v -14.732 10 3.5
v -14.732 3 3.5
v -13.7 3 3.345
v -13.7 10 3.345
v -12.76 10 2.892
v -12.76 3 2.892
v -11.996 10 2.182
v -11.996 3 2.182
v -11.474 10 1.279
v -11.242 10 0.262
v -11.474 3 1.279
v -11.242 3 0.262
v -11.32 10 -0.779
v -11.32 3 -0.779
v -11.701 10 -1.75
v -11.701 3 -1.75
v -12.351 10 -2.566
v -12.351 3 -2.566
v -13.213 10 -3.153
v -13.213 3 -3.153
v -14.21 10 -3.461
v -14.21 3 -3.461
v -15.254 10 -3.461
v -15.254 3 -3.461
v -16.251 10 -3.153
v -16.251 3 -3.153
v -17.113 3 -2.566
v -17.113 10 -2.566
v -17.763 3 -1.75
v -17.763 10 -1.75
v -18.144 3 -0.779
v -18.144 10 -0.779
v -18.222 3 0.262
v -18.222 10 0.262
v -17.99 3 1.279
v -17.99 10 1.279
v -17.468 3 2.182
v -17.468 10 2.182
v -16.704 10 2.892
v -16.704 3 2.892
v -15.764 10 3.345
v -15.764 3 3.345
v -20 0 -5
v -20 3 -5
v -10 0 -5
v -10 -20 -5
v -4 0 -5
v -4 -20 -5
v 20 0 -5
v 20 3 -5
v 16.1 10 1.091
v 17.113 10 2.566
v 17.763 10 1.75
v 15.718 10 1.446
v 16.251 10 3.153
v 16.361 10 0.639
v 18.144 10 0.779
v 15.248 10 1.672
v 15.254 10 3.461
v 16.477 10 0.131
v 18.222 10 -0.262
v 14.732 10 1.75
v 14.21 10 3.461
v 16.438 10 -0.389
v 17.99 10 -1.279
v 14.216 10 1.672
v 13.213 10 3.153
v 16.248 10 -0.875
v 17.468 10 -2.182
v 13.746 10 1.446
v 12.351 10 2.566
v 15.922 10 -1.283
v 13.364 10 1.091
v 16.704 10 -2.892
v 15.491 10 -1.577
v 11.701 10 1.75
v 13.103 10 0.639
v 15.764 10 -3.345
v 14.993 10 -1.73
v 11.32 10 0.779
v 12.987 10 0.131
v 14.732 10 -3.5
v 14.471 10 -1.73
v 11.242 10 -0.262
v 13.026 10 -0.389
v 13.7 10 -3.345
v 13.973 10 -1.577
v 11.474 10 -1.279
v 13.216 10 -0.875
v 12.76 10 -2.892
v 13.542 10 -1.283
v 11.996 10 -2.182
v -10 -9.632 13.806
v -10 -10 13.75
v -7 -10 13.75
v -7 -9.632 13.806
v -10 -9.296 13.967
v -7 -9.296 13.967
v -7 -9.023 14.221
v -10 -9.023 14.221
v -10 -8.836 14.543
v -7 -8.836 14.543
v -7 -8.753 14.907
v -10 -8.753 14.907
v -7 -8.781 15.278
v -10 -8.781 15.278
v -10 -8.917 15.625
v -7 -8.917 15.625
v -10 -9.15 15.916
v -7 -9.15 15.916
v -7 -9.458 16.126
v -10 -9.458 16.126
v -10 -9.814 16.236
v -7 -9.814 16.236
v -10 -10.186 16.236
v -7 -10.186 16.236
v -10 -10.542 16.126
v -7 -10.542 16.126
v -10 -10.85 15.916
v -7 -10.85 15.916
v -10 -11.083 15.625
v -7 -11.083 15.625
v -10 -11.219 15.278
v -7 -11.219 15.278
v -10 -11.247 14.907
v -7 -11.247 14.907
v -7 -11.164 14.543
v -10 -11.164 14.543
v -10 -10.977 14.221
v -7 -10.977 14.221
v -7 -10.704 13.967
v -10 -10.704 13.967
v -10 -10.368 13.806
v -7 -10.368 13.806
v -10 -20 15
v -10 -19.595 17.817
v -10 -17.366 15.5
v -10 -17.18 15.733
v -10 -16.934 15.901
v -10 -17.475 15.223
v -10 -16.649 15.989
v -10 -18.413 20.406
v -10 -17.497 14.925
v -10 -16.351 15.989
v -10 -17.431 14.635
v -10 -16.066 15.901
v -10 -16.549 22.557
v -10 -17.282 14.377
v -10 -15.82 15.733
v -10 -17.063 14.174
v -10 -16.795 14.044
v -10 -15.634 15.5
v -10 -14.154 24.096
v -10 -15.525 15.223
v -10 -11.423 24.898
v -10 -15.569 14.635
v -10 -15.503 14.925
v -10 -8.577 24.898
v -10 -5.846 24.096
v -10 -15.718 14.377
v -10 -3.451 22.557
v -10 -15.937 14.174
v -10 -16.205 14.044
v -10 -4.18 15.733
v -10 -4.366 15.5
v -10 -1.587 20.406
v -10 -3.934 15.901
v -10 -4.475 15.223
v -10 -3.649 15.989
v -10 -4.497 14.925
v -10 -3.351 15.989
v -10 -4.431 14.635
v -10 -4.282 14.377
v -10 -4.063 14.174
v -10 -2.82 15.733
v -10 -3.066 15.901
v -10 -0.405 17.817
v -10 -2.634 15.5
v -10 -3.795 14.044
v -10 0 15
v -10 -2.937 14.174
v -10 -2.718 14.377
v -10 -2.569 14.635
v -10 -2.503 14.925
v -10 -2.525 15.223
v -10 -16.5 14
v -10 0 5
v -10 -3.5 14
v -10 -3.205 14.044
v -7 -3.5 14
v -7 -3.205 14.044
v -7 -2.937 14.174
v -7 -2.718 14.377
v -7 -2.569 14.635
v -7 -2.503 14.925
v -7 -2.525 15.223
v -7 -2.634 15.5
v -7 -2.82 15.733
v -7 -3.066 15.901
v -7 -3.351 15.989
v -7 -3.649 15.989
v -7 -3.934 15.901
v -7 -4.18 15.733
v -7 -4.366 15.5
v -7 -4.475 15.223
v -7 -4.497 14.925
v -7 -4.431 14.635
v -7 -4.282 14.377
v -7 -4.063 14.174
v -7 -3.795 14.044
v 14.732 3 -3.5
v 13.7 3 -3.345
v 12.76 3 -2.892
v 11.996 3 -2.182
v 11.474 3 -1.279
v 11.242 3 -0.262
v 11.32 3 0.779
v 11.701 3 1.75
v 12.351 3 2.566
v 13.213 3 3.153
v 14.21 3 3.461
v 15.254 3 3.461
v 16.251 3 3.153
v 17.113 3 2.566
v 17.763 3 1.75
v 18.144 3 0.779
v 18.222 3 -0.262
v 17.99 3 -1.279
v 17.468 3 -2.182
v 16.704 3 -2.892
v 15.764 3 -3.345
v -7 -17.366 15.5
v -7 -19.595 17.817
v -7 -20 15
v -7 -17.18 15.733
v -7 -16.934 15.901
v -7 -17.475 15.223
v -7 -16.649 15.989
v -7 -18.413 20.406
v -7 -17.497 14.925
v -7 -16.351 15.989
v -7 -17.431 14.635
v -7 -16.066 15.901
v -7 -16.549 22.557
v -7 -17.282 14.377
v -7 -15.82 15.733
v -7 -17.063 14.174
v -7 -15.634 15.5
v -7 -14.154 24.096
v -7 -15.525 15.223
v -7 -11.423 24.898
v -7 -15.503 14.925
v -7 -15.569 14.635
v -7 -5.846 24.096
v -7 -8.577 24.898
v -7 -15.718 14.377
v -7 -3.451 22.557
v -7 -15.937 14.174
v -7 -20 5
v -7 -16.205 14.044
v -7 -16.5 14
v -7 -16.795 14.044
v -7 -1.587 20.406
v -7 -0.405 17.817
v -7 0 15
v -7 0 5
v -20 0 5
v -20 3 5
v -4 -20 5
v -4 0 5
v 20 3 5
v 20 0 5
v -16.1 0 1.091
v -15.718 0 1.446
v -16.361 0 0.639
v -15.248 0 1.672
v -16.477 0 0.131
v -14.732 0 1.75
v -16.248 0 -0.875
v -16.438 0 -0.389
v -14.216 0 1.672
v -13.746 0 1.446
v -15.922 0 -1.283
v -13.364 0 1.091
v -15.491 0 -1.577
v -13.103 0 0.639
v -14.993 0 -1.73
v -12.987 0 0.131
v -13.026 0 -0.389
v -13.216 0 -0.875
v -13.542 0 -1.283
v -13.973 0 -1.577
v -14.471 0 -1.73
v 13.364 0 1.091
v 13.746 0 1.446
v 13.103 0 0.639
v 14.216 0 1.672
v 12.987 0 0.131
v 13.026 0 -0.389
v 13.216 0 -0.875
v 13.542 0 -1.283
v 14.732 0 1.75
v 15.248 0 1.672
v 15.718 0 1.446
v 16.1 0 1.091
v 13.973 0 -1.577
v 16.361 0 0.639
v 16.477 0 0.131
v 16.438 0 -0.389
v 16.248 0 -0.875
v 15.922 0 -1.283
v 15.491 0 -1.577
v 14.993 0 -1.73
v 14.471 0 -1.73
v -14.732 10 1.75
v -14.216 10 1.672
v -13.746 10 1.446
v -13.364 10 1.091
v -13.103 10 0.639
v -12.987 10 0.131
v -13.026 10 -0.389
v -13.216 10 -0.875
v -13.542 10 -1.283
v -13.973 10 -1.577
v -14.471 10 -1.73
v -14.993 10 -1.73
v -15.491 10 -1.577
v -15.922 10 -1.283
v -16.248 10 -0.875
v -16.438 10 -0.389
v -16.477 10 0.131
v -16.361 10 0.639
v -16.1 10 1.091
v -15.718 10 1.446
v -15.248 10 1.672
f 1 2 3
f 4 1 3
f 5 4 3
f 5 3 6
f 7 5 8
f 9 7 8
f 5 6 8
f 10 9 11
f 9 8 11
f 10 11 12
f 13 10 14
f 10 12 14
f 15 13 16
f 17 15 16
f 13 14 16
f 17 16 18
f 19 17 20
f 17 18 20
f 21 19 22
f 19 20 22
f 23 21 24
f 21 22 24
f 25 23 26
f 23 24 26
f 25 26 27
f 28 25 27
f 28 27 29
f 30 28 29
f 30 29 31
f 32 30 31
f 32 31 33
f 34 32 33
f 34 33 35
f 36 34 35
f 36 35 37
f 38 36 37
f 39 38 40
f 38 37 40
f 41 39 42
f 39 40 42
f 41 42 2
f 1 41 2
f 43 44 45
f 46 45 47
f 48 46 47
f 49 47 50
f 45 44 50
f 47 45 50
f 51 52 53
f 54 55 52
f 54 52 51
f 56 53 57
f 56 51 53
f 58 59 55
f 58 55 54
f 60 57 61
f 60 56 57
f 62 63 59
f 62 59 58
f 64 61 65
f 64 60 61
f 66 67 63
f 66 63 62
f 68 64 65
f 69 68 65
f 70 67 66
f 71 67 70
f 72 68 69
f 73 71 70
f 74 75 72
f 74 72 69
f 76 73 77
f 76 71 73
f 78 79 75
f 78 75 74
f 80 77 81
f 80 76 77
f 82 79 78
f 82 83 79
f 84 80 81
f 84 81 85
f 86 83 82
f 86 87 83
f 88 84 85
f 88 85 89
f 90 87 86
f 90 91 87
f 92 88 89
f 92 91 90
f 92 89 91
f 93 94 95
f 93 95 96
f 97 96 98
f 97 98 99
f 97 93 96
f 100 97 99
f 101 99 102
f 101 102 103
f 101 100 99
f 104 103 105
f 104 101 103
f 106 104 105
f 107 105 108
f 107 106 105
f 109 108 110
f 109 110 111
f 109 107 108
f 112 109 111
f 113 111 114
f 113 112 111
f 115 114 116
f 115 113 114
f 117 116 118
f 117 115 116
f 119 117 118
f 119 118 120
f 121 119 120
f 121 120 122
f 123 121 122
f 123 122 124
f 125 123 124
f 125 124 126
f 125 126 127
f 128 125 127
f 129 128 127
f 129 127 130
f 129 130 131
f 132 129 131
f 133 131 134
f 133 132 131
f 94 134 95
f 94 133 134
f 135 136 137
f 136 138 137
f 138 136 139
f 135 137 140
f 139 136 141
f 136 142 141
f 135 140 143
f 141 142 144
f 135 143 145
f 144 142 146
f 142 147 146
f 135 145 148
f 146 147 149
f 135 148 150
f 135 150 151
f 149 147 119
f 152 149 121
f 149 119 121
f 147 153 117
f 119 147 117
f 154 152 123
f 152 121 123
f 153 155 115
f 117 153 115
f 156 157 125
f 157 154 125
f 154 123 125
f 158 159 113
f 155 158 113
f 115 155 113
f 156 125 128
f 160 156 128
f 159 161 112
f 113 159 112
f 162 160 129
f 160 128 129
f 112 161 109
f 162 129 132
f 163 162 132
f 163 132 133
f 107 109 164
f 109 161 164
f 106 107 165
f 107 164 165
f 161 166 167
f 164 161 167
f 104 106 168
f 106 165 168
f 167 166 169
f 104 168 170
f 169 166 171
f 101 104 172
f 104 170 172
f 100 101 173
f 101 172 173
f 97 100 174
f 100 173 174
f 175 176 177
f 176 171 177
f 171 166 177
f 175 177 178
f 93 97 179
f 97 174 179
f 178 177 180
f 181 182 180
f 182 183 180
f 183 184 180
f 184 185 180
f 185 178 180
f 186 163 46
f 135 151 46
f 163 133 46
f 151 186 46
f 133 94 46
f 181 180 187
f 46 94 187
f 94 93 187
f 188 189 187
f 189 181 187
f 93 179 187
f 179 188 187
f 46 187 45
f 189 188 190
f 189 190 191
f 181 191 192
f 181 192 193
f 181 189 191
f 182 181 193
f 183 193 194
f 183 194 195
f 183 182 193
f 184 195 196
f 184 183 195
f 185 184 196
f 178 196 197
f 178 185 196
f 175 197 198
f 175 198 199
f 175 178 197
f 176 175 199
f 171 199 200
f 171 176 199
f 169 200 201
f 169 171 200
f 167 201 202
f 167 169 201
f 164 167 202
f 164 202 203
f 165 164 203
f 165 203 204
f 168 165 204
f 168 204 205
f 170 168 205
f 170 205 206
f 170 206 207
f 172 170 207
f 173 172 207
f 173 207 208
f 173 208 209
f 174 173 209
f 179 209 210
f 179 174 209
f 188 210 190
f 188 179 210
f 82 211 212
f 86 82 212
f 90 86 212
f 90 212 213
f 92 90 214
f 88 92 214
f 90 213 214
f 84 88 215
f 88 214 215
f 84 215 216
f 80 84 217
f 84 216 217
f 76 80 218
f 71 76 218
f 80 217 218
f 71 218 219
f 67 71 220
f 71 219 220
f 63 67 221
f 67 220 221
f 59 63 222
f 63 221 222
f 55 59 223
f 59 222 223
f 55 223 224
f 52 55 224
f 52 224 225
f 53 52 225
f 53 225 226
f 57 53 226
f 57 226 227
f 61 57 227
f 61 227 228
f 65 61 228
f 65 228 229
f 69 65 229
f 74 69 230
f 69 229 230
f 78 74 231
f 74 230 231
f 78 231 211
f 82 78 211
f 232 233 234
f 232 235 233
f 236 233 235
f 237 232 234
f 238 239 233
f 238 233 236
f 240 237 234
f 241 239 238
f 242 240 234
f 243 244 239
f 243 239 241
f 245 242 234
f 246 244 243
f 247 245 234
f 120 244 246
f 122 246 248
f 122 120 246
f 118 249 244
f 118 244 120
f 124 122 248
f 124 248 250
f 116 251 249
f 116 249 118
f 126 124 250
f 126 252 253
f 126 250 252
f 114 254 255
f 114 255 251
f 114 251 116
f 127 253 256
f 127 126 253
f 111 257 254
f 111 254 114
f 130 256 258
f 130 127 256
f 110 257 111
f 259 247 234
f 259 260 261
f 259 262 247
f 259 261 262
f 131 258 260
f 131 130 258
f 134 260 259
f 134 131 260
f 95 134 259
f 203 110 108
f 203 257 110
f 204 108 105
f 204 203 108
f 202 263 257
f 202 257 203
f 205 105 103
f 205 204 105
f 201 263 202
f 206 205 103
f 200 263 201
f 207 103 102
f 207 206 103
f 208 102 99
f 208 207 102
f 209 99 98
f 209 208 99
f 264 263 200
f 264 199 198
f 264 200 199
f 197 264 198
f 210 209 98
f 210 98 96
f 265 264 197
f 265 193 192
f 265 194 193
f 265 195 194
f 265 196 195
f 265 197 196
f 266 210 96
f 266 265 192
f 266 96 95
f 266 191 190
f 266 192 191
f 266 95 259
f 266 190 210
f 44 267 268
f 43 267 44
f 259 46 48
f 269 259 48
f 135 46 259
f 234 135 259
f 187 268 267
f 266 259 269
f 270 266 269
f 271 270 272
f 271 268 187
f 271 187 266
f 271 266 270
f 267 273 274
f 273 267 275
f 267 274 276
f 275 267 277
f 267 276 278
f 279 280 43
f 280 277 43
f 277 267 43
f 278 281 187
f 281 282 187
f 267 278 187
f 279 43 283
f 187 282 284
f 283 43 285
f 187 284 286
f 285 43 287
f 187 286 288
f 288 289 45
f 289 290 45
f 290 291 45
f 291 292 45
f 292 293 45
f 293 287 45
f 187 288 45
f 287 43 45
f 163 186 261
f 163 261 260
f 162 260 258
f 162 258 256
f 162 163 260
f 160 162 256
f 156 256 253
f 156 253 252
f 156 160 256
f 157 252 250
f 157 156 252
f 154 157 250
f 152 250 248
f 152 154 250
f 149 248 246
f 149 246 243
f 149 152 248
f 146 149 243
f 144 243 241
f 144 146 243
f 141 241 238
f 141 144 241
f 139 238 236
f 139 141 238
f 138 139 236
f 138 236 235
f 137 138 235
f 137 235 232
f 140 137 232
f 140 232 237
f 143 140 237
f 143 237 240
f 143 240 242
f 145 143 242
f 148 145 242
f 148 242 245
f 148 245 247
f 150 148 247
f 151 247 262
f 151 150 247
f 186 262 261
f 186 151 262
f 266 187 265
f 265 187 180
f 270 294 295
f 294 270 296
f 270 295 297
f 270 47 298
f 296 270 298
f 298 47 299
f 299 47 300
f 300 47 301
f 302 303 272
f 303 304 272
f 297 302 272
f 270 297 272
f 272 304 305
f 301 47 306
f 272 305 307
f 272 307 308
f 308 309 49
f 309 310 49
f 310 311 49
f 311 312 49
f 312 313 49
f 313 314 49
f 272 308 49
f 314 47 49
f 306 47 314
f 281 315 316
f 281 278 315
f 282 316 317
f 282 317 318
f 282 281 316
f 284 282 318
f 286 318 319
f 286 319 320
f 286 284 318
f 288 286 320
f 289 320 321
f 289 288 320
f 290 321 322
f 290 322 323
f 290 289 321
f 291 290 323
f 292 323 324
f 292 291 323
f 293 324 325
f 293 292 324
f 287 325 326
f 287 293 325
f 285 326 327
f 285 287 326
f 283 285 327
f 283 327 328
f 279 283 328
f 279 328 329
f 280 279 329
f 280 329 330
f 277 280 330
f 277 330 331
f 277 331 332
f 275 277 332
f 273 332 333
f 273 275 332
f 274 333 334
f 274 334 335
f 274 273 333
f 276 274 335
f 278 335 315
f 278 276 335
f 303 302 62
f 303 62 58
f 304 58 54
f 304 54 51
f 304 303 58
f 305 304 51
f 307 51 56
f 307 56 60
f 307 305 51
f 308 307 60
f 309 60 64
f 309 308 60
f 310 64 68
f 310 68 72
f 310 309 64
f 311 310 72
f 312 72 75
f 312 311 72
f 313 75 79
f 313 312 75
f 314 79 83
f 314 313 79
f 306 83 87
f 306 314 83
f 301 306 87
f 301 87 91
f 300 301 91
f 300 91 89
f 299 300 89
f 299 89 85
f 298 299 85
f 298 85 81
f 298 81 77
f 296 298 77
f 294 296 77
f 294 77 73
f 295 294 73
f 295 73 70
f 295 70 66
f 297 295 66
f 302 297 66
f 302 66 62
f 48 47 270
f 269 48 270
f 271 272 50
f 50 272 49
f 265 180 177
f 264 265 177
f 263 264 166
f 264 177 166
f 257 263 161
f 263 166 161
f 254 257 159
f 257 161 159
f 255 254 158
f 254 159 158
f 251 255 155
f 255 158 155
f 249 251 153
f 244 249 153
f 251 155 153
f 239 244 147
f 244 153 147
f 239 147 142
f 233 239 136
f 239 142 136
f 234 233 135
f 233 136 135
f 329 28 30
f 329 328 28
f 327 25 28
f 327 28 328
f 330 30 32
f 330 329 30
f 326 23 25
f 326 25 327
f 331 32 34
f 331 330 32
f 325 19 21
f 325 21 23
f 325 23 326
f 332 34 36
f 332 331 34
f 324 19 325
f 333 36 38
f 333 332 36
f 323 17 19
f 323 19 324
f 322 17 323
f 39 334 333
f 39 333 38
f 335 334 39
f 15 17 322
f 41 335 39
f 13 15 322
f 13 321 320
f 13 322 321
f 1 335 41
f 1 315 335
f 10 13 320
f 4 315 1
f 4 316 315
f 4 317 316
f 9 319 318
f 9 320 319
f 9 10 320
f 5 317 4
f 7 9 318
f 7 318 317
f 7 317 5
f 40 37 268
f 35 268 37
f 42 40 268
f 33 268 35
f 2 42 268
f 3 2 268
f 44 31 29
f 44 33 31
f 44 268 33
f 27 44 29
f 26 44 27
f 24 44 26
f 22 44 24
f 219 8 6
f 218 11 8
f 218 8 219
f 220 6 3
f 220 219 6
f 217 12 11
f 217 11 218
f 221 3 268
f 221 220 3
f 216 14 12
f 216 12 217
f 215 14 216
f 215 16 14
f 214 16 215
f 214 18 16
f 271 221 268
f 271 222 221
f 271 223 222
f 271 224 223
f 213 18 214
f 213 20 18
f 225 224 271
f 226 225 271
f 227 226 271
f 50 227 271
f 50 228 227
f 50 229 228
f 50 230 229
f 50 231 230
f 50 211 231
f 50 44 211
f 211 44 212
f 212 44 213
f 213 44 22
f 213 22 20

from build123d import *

# Parameters (mm, degrees)
SKETCH_1_W      = 40
SKETCH_1_H      = 10
SKETCH_1_R      = 1.75
EXTRUDE_1_DEPTH = 3
EXTRUDE_START   = -10
SKETCH_2_R      = 1
SKETCH_2_R_2    = 1.25
EXTRUDE_2_DEPTH = 3
SKETCH_3_W      = 3
SKETCH_3_H      = 10
EXTRUDE_3_DEPTH = 20
SKETCH_4_R      = 3.5
SKETCH_4_R_2    = 1.75
EXTRUDE_4_DEPTH = 7


with BuildPart() as part:
    # 草图1 → 凸台-拉伸1 (new body)
    with BuildSketch(Plane(origin=(0, 0, 0), x_dir=(1, 0, 0), z_dir=(0, 1, 0))):
        Rectangle(SKETCH_1_W, SKETCH_1_H)
        with Locations(Location((-14.732, 0, 0), (0, 0, 270))):
            Circle(SKETCH_1_R, mode=Mode.SUBTRACT)
        with Locations(Location((14.732, 0, 0), (0, 0, 270))):
            Circle(SKETCH_1_R, mode=Mode.SUBTRACT)
    extrude(amount=EXTRUDE_1_DEPTH)

    # 草图2 → 凸台-拉伸2 (add)
    with BuildSketch(Plane(origin=(0, 0, 0), x_dir=(0, 0, -1), z_dir=(1, 0, 0)).offset(EXTRUDE_START)):
        with BuildLine():
            Line((5, 0), (-15, 0))
            ThreePointArc((-15, 0), (-25, -10), (-15, -20))
            Line((-15, -20), (5, -20))
            Line((5, -20), (5, 0))
        make_face()
        with Locations((-15, -3.5)):
            Circle(SKETCH_2_R, mode=Mode.SUBTRACT)
        with Locations((-15, -16.5)):
            Circle(SKETCH_2_R, mode=Mode.SUBTRACT)
        with Locations((-15, -10)):
            Circle(SKETCH_2_R_2, mode=Mode.SUBTRACT)
    extrude(amount=EXTRUDE_2_DEPTH)

    # 草图3 → 凸台-拉伸3 (add)
    with BuildSketch(Plane.XZ):
        with Locations((-5.5, 0)):
            Rectangle(SKETCH_3_W, SKETCH_3_H)
    extrude(amount=EXTRUDE_3_DEPTH)

    # 草图4 → 凸台-拉伸4 (add)
    # profile 1 of 2: a face of its own
    with BuildSketch(Plane(origin=(0, 3, 0), x_dir=(1, 0, 0), z_dir=(0, 1, 0))):
        with Locations(Location((-14.732, 0, 0), (0, 0, 270))):
            Circle(SKETCH_4_R)
        with Locations(Location((-14.732, 0, 0), (0, 0, 270))):
            Circle(SKETCH_4_R_2, mode=Mode.SUBTRACT)
    # profile 2 of 2: a face of its own
    with BuildSketch(Plane(origin=(0, 3, 0), x_dir=(1, 0, 0), z_dir=(0, 1, 0))):
        with Locations(Location((14.732, 0, 0), (0, 0, 90))):
            Circle(SKETCH_4_R)
        with Locations(Location((14.732, 0, 0), (0, 0, 270))):
            Circle(SKETCH_4_R_2, mode=Mode.SUBTRACT)
    extrude(amount=EXTRUDE_4_DEPTH)


solid = part.part
